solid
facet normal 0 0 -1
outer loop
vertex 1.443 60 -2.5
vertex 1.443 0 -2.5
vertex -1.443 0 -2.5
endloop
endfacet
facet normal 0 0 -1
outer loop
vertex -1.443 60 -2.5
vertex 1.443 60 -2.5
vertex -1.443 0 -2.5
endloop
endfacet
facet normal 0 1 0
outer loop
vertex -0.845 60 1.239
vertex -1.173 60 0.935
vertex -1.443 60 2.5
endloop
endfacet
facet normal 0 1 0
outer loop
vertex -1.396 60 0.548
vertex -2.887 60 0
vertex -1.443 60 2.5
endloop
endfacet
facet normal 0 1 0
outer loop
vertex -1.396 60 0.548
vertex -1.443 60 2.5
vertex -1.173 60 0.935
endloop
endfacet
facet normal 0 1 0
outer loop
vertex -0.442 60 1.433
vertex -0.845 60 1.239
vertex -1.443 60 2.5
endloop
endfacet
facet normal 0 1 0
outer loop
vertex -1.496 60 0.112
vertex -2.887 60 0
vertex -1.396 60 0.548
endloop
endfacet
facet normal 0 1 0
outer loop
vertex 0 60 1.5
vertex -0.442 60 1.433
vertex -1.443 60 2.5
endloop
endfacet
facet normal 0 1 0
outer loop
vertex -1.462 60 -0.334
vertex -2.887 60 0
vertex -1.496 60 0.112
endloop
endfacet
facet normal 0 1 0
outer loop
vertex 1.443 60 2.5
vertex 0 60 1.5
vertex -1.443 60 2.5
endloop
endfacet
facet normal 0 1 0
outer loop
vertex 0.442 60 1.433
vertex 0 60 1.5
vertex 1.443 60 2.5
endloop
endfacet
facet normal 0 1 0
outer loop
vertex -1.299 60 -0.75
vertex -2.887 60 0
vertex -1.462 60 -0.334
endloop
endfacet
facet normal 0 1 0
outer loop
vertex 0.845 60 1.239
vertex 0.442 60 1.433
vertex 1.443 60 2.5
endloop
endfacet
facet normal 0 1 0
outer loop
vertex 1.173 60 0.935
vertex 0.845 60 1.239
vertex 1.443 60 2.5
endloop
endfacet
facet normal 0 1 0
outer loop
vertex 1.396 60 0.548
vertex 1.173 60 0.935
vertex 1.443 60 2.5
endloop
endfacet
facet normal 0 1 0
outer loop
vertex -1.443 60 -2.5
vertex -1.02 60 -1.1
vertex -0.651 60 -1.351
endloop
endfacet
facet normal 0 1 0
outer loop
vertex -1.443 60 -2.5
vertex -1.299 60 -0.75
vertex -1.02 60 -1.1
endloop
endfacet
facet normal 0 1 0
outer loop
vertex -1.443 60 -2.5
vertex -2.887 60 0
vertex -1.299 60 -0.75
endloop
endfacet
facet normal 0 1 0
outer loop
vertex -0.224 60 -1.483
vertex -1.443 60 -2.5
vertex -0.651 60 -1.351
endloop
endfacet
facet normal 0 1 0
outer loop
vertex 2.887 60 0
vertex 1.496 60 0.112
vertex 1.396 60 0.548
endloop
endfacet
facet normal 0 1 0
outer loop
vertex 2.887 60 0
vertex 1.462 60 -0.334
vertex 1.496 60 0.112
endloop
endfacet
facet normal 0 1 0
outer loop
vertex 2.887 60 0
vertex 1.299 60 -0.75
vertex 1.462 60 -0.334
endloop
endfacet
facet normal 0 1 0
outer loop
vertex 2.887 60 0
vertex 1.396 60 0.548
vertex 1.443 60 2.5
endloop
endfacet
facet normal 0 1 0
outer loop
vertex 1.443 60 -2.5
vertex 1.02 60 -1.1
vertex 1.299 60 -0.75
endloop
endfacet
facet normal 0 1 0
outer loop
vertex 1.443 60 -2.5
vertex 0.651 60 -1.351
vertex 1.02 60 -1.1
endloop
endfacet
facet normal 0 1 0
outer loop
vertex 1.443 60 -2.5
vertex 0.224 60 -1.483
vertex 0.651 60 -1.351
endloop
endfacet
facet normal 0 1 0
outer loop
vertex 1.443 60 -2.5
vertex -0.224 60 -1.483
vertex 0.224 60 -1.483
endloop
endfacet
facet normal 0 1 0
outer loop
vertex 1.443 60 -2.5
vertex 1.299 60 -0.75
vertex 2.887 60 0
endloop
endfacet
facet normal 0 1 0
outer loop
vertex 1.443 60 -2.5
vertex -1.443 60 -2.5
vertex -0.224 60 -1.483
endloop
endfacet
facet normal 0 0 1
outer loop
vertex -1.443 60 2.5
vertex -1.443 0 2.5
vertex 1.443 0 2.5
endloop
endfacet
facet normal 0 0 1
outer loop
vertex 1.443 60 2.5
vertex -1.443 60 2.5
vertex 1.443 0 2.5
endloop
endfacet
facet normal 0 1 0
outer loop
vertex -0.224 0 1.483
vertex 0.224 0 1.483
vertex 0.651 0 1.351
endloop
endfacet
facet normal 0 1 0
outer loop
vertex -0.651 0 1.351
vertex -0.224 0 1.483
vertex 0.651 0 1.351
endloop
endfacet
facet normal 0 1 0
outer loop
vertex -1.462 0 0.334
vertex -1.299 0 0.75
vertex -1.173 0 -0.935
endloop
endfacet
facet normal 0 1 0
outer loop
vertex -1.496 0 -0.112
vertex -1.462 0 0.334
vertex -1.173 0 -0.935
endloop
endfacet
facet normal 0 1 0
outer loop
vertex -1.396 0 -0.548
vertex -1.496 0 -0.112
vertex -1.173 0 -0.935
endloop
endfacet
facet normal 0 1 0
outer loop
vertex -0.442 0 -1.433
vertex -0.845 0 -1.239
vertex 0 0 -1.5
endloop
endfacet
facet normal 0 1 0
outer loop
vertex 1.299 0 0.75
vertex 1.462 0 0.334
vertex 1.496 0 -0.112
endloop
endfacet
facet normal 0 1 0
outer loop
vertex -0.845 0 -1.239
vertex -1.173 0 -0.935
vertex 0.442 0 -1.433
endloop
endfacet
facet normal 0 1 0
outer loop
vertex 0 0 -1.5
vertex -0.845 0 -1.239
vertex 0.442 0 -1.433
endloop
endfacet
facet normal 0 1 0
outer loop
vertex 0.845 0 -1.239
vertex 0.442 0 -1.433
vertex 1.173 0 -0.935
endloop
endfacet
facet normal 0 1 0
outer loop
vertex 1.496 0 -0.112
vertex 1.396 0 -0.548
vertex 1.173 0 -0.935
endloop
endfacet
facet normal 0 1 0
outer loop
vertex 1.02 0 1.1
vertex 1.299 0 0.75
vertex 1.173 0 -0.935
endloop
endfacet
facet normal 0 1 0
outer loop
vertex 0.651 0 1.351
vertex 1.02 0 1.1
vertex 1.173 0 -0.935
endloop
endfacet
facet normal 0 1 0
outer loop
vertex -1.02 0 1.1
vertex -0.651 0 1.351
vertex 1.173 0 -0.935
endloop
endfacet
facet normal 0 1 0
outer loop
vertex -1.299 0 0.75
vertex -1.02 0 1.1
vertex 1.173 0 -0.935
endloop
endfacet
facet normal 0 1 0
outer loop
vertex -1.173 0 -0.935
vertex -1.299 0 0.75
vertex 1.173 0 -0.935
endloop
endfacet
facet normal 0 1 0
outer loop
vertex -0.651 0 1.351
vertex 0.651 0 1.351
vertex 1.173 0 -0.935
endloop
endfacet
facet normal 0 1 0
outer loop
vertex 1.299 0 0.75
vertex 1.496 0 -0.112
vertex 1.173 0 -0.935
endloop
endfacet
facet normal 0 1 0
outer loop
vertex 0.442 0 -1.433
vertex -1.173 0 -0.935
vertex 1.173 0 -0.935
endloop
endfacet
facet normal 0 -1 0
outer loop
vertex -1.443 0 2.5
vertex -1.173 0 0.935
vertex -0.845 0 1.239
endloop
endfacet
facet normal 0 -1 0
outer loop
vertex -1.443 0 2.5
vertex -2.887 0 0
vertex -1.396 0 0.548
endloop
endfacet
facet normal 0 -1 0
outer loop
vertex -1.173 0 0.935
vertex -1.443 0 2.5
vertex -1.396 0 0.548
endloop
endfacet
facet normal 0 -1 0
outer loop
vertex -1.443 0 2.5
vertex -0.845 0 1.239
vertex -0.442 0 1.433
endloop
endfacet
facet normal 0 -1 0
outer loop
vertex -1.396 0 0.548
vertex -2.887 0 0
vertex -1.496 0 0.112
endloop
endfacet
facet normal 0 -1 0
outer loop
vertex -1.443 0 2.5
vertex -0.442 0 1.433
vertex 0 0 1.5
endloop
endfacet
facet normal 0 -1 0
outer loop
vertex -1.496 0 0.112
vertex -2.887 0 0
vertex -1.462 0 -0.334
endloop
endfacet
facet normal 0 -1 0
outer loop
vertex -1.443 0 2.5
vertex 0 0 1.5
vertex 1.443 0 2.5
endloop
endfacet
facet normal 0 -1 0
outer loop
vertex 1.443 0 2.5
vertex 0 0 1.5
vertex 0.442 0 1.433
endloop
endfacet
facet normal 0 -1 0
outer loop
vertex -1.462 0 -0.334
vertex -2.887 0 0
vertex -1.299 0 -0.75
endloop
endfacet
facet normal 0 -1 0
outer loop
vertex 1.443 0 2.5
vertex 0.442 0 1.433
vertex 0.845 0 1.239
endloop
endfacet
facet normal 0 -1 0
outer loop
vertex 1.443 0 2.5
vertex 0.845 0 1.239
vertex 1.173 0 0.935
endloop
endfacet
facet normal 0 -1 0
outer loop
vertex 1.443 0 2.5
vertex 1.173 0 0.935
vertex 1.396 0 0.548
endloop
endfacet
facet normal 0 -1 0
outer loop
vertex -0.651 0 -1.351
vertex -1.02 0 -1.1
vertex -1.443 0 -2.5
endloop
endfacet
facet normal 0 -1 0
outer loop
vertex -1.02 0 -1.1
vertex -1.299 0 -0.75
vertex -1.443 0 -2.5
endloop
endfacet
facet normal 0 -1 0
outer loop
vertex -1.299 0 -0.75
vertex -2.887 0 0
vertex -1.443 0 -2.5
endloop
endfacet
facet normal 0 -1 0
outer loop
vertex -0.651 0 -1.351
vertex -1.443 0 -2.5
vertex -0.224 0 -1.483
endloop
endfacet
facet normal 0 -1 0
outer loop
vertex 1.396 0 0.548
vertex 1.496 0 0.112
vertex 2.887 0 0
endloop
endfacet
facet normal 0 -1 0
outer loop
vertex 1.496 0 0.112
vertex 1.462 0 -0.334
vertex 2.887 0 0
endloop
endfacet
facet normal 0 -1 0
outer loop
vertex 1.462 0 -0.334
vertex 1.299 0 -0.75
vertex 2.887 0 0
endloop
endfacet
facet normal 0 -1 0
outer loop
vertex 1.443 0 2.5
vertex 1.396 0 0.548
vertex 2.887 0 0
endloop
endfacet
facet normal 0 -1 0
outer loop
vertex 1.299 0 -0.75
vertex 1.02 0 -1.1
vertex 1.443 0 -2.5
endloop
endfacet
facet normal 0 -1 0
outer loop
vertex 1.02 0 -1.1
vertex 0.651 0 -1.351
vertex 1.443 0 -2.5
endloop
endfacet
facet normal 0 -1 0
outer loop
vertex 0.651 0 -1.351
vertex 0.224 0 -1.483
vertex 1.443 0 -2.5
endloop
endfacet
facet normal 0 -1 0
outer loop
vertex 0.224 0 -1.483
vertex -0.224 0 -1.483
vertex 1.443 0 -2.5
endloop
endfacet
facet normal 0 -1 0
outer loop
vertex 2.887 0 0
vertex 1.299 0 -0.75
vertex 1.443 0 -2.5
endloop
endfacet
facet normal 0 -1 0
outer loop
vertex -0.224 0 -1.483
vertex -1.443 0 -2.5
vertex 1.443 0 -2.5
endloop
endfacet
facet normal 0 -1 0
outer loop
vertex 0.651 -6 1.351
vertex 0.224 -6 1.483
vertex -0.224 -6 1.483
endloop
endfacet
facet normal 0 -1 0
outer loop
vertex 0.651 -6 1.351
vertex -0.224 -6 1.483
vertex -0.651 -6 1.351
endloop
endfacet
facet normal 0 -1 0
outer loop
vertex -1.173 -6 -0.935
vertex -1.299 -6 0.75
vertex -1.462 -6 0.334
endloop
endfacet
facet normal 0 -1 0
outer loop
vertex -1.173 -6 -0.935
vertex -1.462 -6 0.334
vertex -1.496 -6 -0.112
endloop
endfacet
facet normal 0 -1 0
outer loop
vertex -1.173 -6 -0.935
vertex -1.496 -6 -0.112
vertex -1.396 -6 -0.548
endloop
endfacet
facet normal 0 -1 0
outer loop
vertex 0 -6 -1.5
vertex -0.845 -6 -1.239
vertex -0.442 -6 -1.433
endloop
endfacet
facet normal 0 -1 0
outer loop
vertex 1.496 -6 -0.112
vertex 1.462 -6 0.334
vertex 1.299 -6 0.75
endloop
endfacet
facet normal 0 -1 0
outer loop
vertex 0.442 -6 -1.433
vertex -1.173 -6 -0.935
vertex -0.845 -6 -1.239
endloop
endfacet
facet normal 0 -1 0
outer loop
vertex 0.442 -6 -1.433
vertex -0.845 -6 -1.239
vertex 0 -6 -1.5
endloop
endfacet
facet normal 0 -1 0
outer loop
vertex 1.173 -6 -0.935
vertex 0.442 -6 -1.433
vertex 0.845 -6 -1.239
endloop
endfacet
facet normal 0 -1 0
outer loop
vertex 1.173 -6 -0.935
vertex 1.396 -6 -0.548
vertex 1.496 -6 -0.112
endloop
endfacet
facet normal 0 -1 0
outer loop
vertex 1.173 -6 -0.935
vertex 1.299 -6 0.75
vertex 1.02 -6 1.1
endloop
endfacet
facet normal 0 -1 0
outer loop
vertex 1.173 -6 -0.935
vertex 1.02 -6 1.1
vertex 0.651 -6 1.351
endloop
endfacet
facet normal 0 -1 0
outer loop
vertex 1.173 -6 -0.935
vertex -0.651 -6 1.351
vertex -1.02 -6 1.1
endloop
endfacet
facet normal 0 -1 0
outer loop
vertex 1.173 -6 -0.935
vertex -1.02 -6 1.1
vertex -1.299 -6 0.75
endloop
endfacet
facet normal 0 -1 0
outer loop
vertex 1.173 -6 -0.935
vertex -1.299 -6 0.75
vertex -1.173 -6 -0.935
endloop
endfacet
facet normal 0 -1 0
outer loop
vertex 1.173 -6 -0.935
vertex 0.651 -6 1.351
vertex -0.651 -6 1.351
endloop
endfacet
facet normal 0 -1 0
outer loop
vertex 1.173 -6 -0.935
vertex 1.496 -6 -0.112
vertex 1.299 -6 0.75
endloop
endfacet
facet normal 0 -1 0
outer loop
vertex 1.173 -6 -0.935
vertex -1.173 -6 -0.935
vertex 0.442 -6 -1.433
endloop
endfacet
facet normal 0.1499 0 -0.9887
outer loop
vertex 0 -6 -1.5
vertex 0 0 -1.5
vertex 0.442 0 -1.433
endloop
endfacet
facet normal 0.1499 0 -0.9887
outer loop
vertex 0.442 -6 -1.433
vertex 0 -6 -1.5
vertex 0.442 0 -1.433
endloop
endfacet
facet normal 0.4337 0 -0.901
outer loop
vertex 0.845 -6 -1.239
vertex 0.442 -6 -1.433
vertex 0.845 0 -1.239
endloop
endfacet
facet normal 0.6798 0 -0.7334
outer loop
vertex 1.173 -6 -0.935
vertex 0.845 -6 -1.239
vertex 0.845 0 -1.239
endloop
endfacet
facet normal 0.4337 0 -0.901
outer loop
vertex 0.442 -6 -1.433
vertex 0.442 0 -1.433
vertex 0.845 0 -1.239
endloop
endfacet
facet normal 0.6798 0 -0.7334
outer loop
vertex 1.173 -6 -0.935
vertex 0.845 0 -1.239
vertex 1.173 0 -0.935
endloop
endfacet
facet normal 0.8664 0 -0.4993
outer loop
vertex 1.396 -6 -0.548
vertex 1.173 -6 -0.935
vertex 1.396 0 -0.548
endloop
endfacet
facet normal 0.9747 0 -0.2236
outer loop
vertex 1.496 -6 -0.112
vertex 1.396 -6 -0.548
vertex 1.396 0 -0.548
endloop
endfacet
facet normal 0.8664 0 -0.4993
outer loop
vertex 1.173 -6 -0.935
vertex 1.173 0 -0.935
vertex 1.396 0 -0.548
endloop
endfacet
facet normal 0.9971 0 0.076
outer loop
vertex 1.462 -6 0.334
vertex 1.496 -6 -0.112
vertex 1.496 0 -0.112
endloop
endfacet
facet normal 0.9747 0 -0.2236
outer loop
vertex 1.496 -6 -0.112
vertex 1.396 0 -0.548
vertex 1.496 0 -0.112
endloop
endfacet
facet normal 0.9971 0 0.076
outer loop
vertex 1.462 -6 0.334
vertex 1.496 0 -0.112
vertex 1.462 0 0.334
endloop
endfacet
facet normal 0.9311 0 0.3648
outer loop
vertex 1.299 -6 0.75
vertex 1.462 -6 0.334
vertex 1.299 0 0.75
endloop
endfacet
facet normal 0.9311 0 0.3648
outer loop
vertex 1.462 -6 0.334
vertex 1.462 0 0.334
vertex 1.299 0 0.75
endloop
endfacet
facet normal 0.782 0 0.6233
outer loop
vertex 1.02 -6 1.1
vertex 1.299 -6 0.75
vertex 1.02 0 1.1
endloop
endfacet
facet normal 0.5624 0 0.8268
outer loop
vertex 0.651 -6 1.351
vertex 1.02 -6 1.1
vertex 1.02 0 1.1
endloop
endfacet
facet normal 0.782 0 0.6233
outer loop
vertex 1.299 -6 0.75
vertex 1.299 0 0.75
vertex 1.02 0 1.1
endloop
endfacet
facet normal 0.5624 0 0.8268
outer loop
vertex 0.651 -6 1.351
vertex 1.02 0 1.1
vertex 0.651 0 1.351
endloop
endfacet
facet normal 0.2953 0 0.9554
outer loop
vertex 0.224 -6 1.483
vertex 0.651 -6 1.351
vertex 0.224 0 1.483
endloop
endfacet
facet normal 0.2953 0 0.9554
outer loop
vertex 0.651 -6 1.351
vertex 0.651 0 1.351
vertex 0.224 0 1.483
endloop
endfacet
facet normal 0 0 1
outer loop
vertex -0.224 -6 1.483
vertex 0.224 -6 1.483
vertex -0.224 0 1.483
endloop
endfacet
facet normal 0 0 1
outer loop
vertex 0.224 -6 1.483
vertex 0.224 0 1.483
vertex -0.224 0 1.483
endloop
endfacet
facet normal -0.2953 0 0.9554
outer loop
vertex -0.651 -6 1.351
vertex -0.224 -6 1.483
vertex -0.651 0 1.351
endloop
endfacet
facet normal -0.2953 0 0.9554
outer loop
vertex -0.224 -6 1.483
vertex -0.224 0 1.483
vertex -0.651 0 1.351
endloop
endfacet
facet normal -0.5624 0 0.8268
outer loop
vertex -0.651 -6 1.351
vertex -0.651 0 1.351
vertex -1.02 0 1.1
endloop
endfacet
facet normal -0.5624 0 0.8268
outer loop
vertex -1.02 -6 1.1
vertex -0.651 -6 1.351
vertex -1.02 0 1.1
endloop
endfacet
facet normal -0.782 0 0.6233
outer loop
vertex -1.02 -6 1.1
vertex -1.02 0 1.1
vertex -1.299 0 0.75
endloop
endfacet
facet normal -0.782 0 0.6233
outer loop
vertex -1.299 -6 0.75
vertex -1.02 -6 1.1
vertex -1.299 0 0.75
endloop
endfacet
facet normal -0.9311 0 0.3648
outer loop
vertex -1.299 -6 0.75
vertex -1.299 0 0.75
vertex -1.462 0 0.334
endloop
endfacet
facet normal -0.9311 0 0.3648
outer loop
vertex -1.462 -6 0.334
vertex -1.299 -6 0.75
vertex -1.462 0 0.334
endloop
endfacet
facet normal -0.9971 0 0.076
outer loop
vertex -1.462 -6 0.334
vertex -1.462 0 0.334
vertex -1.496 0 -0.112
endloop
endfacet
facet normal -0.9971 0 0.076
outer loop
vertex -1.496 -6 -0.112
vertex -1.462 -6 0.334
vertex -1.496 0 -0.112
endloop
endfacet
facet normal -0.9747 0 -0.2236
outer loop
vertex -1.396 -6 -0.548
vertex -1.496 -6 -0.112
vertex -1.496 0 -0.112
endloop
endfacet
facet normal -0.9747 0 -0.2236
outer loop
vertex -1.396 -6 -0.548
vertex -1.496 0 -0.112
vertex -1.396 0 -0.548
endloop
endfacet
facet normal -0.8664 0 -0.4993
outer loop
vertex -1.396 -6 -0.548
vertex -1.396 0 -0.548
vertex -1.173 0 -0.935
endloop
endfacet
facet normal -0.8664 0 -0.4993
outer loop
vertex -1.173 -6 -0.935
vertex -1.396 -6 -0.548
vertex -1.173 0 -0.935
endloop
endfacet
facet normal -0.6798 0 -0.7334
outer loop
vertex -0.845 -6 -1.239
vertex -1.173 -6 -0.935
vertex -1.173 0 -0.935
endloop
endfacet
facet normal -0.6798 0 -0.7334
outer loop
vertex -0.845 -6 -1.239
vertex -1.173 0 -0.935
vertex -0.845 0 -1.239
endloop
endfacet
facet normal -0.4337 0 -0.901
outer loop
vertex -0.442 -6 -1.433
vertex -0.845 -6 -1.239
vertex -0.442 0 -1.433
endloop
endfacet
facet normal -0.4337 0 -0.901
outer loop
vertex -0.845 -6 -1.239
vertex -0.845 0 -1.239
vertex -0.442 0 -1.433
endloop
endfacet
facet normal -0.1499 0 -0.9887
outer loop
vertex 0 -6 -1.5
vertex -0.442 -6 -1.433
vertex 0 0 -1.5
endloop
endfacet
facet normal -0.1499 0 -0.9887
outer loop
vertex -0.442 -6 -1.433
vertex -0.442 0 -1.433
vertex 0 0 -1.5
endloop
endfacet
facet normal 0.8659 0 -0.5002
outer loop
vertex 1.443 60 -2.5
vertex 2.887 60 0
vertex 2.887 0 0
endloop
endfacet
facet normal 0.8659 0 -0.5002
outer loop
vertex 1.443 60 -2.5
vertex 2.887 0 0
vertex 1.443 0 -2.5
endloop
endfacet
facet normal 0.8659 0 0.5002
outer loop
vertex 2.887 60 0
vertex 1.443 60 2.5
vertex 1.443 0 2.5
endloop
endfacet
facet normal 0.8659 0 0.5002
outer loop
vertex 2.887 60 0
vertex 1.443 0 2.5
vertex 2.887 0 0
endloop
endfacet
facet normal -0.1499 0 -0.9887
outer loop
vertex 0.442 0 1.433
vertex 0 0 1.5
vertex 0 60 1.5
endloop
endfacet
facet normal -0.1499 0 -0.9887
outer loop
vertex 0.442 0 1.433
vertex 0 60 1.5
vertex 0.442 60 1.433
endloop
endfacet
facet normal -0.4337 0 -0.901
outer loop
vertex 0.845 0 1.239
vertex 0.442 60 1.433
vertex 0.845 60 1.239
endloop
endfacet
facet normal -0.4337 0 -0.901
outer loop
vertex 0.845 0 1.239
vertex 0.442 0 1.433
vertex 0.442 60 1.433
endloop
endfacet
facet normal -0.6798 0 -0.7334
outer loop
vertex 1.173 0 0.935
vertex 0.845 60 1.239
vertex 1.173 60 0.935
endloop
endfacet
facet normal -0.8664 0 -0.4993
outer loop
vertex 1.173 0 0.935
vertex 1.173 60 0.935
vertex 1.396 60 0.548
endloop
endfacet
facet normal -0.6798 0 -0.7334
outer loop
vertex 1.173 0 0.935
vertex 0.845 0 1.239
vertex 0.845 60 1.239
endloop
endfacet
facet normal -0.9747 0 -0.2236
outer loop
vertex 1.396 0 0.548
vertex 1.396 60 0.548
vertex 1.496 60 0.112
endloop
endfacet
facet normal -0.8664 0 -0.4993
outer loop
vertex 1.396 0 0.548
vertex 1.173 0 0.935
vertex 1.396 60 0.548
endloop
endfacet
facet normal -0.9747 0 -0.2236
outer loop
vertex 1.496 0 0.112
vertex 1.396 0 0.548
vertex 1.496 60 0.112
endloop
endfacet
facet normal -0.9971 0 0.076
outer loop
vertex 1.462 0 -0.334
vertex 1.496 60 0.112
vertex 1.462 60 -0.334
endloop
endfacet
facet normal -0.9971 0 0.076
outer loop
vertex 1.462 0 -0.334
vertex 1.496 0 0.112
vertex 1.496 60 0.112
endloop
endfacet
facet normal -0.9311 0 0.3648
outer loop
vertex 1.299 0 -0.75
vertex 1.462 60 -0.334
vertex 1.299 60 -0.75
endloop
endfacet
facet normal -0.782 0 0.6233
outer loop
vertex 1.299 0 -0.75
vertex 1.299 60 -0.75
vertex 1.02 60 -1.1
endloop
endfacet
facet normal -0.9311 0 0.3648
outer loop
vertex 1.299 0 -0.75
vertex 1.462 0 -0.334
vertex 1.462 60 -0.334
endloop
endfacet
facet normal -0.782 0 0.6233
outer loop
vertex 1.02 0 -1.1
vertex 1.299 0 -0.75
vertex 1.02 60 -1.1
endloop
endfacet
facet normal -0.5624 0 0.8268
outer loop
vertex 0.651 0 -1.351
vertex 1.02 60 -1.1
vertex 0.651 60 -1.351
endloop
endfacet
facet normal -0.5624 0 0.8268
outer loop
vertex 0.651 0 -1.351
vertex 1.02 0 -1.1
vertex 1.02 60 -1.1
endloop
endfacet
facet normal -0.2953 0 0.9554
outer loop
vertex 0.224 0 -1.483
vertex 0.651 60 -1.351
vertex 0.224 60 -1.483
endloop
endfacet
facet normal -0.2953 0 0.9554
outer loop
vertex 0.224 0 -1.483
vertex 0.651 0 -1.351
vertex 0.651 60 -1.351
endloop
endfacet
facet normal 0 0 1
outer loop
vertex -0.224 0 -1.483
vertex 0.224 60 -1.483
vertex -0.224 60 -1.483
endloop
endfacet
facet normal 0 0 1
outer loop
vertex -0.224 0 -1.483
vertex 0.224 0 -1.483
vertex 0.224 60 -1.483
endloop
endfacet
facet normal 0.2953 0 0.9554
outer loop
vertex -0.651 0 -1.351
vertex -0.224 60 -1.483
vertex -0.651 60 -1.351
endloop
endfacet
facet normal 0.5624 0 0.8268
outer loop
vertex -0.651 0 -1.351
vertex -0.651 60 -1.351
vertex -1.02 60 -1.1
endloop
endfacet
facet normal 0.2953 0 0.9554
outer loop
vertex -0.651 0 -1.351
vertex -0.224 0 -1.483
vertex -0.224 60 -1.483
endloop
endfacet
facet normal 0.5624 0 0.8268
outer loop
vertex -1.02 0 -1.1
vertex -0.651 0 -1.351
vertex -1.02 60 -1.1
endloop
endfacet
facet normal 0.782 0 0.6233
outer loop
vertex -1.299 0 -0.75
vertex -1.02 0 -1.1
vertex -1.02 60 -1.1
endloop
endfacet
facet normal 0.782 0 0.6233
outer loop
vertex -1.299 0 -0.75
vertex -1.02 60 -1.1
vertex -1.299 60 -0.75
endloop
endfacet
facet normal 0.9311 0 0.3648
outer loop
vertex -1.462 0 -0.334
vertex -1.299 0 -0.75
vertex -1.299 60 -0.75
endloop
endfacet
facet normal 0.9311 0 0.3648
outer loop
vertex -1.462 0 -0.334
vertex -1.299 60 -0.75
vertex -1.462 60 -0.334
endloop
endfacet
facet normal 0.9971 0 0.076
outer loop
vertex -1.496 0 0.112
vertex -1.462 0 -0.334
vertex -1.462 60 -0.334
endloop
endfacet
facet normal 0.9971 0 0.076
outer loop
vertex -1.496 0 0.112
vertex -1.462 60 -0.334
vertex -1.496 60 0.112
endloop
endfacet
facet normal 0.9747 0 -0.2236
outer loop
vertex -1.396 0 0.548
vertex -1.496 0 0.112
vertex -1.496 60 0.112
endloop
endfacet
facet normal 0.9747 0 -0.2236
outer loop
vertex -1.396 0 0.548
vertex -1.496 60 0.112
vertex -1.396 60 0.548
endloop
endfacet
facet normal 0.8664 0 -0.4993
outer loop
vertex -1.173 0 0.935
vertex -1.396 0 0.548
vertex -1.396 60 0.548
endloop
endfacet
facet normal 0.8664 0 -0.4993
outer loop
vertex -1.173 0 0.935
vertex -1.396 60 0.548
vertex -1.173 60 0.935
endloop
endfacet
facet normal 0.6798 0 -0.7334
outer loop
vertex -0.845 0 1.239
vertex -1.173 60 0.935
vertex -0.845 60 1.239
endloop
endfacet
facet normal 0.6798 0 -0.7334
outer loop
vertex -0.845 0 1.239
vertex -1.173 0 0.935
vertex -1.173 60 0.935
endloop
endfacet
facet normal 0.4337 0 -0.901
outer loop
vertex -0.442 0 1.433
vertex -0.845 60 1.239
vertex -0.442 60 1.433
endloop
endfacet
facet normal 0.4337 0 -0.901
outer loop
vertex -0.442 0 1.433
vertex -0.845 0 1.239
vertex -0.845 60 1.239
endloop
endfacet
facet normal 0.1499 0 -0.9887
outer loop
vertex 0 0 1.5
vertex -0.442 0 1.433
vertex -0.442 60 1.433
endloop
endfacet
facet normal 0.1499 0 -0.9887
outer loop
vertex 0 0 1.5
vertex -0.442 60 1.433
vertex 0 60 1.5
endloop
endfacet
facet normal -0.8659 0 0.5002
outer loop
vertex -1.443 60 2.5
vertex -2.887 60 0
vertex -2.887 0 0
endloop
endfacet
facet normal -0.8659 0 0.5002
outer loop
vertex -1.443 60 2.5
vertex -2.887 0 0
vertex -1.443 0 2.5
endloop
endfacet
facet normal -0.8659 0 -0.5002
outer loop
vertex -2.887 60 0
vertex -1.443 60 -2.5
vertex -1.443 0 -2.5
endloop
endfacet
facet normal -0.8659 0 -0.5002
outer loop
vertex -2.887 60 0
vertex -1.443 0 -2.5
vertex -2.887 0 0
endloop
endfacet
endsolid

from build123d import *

# Parameters (mm, degrees)
CROQUIS1_R              = 1.5
SALIENTE_EXTRUIR1_DEPTH = 60
CROQUIS2_R              = 1.5
SALIENTE_EXTRUIR2_DEPTH = 6


with BuildPart() as part:
    # Croquis1 → Saliente-Extruir1 (new body)
    with BuildSketch(Plane(origin=(0, 0, 0), x_dir=(1, 0, 0), z_dir=(0, 1, 0))):
        Polygon((1.443375673, -2.5), (2.886751346, 0), (1.443375673, 2.5), (-1.443375673, 2.5), (-2.886751346, 0), (-1.443375673, -2.5), align=None)
        with Locations(Location((0, 0, 0), (0, 0, 270))):
            Circle(CROQUIS1_R, mode=Mode.SUBTRACT)
    extrude(amount=SALIENTE_EXTRUIR1_DEPTH)


with BuildPart() as body_2:
    # Croquis2 → Saliente-Extruir2 (new body)
    with BuildSketch(Plane.XZ):
        with Locations(Location((0, 0, 0), (0, 0, 270))):
            Circle(CROQUIS2_R)
    extrude(amount=SALIENTE_EXTRUIR2_DEPTH)


solid = Compound([part.part, body_2.part])
